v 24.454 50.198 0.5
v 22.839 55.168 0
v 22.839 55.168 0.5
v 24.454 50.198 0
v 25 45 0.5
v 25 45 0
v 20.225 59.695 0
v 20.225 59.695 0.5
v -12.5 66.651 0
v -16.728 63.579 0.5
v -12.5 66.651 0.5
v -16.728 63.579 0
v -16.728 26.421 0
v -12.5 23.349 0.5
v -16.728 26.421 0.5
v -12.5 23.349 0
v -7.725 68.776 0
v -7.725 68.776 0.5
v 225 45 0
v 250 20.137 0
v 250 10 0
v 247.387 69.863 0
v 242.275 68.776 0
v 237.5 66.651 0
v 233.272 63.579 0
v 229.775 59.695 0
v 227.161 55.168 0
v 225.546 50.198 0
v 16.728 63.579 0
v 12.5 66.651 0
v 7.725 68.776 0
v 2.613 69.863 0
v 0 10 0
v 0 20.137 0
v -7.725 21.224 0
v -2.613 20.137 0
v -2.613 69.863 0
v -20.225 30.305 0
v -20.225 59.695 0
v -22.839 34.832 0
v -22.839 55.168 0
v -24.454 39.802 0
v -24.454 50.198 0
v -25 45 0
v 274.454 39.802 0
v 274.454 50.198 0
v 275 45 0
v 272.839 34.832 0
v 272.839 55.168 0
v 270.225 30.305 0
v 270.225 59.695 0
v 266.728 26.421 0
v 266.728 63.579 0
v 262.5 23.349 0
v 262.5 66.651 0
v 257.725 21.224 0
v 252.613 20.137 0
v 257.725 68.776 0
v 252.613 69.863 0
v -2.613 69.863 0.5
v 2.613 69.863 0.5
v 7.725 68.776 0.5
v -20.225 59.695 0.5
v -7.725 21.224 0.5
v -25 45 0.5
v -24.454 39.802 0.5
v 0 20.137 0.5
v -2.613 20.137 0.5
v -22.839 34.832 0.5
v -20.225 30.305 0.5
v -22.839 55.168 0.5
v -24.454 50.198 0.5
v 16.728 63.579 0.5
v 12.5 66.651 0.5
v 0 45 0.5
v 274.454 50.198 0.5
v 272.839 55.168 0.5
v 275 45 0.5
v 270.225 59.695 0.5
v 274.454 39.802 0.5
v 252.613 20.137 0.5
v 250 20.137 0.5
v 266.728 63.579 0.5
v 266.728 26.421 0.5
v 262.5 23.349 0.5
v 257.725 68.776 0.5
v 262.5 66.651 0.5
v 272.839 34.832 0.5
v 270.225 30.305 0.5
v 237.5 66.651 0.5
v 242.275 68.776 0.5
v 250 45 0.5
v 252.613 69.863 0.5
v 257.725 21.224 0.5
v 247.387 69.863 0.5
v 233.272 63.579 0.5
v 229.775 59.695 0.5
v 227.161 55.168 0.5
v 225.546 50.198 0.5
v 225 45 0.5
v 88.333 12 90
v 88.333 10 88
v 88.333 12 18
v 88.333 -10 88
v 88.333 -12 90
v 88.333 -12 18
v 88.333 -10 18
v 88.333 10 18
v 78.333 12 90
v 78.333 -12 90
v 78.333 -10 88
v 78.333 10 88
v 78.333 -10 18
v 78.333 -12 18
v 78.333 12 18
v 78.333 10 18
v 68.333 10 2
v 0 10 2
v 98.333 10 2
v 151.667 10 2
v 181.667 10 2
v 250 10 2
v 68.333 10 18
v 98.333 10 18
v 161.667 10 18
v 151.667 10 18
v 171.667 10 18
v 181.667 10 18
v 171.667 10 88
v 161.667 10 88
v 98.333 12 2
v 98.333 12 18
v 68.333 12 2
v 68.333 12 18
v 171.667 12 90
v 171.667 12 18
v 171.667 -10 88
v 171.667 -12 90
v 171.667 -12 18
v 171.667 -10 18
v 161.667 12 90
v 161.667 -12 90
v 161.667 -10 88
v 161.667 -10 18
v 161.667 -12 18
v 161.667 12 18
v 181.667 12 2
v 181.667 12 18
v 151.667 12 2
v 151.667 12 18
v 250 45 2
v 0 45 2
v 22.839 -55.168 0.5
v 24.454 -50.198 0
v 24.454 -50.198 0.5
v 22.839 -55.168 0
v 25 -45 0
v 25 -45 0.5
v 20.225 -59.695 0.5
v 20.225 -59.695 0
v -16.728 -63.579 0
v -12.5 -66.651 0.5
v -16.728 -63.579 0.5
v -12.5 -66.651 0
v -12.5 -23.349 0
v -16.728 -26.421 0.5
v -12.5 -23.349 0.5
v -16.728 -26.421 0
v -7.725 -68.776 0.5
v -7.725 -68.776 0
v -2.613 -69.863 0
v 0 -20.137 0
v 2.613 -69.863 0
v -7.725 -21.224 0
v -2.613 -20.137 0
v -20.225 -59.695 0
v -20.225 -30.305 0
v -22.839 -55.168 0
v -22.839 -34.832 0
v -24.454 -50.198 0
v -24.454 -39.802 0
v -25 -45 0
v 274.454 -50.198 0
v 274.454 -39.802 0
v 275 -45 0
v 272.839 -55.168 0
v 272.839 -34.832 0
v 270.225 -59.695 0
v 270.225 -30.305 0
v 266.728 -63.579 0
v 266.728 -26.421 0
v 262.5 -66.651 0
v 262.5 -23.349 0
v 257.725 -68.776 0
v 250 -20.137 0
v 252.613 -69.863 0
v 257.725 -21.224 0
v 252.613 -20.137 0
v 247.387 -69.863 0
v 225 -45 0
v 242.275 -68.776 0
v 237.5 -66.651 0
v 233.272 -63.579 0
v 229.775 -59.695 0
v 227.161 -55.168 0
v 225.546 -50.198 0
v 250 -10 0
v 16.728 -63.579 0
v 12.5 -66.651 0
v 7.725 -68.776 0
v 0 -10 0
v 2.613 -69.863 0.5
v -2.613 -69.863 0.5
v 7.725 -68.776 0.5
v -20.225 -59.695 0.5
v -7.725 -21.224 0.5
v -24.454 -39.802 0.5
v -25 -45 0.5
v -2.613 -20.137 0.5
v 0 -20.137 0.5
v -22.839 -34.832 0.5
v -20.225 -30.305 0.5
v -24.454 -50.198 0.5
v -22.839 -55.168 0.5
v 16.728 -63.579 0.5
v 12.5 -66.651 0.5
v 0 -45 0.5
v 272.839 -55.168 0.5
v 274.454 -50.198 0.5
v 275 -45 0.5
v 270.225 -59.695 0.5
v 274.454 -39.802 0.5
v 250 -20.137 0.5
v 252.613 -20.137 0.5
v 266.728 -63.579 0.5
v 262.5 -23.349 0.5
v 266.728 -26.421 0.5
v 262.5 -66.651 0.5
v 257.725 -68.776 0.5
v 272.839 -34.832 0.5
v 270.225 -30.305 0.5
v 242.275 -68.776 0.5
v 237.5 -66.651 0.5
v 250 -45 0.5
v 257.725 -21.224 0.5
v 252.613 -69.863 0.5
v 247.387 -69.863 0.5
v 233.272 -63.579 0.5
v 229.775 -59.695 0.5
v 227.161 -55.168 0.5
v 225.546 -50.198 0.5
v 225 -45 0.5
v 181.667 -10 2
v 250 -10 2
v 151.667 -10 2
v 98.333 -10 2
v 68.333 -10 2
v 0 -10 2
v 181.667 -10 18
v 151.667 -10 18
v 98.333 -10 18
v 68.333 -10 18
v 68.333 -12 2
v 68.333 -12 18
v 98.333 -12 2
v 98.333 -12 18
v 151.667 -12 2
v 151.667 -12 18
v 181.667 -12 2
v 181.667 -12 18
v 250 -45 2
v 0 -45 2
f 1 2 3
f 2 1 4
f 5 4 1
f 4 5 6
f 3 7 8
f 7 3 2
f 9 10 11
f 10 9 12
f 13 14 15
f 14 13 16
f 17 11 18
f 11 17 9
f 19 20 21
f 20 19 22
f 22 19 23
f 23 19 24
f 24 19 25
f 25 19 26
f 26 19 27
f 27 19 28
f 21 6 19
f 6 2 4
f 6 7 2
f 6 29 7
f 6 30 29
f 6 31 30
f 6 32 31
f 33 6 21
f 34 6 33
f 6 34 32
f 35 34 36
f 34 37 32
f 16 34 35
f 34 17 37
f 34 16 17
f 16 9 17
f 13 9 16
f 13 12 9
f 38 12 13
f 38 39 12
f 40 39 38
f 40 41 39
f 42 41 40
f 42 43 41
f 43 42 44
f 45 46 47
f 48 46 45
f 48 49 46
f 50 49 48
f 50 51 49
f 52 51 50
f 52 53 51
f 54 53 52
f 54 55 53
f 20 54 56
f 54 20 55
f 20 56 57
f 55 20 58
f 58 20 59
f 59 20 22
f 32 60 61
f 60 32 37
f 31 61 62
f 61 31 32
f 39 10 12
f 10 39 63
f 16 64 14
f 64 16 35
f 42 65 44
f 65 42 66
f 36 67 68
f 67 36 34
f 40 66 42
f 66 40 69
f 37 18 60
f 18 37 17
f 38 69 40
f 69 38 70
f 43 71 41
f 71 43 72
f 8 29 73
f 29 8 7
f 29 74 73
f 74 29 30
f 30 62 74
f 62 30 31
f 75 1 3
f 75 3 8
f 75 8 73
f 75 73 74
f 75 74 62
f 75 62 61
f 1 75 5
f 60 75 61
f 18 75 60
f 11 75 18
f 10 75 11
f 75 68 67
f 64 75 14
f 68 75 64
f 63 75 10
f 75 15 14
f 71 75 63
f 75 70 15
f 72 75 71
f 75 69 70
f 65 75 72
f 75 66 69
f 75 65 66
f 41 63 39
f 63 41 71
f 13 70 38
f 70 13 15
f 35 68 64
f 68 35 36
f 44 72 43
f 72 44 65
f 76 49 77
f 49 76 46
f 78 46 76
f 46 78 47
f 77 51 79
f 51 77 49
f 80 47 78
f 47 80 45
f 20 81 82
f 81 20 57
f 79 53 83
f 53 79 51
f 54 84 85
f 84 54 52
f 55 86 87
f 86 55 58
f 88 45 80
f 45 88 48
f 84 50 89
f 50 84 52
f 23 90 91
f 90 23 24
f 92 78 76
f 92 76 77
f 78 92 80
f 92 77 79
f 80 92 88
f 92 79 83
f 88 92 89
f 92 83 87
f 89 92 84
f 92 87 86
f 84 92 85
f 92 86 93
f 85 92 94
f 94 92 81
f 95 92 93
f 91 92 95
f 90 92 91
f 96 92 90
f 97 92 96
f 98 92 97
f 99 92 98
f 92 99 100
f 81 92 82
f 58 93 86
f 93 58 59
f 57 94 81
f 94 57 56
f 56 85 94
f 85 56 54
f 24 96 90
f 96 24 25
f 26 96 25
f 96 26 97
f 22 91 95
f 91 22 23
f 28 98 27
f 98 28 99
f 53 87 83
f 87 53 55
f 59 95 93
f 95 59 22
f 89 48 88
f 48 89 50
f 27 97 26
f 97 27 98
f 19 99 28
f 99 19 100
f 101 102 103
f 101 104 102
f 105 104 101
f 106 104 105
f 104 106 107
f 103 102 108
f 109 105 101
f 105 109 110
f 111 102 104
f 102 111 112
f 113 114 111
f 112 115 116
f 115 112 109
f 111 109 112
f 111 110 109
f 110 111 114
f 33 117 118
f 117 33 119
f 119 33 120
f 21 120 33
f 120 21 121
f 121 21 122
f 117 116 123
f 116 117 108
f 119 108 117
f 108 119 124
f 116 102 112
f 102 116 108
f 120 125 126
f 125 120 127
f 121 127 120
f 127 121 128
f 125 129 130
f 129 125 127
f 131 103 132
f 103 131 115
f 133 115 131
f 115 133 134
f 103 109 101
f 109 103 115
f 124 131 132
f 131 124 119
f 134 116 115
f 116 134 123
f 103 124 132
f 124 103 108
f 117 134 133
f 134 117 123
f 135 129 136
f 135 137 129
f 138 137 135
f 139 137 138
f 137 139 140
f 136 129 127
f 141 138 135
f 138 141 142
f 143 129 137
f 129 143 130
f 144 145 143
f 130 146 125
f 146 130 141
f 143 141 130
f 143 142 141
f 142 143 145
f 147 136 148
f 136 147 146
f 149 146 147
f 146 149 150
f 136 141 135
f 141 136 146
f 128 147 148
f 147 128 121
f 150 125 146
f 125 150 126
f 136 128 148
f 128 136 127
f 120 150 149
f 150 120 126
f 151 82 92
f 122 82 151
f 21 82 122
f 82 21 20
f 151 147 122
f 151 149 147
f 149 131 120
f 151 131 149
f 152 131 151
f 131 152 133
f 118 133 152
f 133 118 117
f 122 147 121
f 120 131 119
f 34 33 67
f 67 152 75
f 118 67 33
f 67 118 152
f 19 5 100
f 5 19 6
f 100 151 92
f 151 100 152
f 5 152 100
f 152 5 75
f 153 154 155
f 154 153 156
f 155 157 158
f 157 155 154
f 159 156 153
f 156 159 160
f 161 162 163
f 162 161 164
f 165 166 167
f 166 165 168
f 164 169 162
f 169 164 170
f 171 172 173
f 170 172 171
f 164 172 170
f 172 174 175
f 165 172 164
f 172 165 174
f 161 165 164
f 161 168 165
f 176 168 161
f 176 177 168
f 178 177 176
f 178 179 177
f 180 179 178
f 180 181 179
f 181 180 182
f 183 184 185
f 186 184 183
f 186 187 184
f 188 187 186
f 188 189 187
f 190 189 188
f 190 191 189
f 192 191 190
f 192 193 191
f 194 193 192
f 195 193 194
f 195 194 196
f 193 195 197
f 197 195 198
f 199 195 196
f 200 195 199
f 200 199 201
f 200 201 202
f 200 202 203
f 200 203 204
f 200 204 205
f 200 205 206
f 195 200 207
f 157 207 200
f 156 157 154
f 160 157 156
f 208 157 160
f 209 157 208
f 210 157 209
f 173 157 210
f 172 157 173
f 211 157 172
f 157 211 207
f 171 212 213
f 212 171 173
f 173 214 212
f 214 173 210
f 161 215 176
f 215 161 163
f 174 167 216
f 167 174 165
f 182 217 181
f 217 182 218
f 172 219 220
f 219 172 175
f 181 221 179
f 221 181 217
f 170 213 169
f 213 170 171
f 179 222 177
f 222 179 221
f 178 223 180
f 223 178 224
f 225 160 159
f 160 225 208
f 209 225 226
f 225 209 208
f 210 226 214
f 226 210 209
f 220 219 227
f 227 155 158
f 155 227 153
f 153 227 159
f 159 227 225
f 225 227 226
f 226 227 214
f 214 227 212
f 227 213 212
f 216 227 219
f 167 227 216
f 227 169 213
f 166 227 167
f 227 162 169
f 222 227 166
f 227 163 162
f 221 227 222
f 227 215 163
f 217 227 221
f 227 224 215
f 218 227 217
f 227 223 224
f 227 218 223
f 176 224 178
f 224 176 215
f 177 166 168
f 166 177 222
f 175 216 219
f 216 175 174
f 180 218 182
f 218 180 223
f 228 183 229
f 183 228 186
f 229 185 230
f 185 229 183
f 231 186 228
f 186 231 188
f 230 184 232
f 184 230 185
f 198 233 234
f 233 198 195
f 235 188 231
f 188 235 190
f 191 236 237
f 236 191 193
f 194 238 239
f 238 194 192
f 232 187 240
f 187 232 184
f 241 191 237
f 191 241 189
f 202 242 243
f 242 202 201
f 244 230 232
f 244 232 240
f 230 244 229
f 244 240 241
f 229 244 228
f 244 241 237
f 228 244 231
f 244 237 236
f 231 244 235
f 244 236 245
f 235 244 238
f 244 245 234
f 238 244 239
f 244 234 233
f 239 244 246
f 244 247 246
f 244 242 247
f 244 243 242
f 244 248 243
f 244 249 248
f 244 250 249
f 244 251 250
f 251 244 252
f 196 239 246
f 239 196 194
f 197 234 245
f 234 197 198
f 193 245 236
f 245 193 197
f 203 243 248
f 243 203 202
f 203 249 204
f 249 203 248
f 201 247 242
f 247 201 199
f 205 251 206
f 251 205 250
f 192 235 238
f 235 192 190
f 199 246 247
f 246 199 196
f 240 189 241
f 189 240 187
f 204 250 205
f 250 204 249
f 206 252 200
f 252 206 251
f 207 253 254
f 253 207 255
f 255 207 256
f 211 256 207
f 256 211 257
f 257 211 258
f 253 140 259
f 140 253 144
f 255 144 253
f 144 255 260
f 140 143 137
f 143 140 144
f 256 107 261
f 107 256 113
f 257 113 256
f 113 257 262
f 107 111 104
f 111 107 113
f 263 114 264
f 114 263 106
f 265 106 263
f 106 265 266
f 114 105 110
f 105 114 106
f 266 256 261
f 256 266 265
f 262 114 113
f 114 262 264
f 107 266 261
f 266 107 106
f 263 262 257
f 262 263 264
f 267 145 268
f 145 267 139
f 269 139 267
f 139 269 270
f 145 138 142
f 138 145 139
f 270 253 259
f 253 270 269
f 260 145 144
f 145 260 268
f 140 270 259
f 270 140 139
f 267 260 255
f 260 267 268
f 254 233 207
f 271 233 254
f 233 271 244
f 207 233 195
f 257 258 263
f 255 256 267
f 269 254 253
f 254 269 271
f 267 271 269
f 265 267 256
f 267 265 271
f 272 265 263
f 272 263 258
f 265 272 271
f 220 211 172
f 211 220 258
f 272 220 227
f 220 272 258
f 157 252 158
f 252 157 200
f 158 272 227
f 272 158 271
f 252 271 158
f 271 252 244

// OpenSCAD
length = 250;
height = 90;
padding = 10;
width = 35;
thickness = 2;

branch_width = 10;

pad_r = 25;
pad_num = 1;

module drawHalfPlate() {
	union() {
		translate([0, padding])
			cube([length, width, thickness]);
	
		translate([length / 3 - branch_width / 2, padding, 0]) {
			translate([0, -padding, height - thickness])
				cube([branch_width, padding, thickness]);
			cube([branch_width, thickness, height]);
		
			translate([- branch_width, 0, 0])
				cube([branch_width * 3, thickness, height / 5]);
		}
		
		translate([length * 2 / 3 - branch_width / 2, padding, 0]) {
			translate([0, -padding, height - thickness])
				cube([branch_width, padding, thickness]);
			cube([branch_width, thickness, height]);
	
			translate([- branch_width, 0, 0])
				cube([branch_width * 3, thickness, height / 5]);
		}
	}
}

module drawHalf() {
	x_delta = length / pad_num;

	difference() {
		union() {
			for (i = [0:pad_num]) {
				translate([i * x_delta, width + padding, 0.25])
					cylinder(0.5, pad_r, pad_r, true);

				//translate([i * x_delta, padding, 0.5])
				//	cylinder(1, pad_r, pad_r, true);
			}
		}

		drawHalfPlate();
	}

	drawHalfPlate();
}

union() {
	drawHalf();
	mirror([0, width, 0]) {
		drawHalf();
	}
}
